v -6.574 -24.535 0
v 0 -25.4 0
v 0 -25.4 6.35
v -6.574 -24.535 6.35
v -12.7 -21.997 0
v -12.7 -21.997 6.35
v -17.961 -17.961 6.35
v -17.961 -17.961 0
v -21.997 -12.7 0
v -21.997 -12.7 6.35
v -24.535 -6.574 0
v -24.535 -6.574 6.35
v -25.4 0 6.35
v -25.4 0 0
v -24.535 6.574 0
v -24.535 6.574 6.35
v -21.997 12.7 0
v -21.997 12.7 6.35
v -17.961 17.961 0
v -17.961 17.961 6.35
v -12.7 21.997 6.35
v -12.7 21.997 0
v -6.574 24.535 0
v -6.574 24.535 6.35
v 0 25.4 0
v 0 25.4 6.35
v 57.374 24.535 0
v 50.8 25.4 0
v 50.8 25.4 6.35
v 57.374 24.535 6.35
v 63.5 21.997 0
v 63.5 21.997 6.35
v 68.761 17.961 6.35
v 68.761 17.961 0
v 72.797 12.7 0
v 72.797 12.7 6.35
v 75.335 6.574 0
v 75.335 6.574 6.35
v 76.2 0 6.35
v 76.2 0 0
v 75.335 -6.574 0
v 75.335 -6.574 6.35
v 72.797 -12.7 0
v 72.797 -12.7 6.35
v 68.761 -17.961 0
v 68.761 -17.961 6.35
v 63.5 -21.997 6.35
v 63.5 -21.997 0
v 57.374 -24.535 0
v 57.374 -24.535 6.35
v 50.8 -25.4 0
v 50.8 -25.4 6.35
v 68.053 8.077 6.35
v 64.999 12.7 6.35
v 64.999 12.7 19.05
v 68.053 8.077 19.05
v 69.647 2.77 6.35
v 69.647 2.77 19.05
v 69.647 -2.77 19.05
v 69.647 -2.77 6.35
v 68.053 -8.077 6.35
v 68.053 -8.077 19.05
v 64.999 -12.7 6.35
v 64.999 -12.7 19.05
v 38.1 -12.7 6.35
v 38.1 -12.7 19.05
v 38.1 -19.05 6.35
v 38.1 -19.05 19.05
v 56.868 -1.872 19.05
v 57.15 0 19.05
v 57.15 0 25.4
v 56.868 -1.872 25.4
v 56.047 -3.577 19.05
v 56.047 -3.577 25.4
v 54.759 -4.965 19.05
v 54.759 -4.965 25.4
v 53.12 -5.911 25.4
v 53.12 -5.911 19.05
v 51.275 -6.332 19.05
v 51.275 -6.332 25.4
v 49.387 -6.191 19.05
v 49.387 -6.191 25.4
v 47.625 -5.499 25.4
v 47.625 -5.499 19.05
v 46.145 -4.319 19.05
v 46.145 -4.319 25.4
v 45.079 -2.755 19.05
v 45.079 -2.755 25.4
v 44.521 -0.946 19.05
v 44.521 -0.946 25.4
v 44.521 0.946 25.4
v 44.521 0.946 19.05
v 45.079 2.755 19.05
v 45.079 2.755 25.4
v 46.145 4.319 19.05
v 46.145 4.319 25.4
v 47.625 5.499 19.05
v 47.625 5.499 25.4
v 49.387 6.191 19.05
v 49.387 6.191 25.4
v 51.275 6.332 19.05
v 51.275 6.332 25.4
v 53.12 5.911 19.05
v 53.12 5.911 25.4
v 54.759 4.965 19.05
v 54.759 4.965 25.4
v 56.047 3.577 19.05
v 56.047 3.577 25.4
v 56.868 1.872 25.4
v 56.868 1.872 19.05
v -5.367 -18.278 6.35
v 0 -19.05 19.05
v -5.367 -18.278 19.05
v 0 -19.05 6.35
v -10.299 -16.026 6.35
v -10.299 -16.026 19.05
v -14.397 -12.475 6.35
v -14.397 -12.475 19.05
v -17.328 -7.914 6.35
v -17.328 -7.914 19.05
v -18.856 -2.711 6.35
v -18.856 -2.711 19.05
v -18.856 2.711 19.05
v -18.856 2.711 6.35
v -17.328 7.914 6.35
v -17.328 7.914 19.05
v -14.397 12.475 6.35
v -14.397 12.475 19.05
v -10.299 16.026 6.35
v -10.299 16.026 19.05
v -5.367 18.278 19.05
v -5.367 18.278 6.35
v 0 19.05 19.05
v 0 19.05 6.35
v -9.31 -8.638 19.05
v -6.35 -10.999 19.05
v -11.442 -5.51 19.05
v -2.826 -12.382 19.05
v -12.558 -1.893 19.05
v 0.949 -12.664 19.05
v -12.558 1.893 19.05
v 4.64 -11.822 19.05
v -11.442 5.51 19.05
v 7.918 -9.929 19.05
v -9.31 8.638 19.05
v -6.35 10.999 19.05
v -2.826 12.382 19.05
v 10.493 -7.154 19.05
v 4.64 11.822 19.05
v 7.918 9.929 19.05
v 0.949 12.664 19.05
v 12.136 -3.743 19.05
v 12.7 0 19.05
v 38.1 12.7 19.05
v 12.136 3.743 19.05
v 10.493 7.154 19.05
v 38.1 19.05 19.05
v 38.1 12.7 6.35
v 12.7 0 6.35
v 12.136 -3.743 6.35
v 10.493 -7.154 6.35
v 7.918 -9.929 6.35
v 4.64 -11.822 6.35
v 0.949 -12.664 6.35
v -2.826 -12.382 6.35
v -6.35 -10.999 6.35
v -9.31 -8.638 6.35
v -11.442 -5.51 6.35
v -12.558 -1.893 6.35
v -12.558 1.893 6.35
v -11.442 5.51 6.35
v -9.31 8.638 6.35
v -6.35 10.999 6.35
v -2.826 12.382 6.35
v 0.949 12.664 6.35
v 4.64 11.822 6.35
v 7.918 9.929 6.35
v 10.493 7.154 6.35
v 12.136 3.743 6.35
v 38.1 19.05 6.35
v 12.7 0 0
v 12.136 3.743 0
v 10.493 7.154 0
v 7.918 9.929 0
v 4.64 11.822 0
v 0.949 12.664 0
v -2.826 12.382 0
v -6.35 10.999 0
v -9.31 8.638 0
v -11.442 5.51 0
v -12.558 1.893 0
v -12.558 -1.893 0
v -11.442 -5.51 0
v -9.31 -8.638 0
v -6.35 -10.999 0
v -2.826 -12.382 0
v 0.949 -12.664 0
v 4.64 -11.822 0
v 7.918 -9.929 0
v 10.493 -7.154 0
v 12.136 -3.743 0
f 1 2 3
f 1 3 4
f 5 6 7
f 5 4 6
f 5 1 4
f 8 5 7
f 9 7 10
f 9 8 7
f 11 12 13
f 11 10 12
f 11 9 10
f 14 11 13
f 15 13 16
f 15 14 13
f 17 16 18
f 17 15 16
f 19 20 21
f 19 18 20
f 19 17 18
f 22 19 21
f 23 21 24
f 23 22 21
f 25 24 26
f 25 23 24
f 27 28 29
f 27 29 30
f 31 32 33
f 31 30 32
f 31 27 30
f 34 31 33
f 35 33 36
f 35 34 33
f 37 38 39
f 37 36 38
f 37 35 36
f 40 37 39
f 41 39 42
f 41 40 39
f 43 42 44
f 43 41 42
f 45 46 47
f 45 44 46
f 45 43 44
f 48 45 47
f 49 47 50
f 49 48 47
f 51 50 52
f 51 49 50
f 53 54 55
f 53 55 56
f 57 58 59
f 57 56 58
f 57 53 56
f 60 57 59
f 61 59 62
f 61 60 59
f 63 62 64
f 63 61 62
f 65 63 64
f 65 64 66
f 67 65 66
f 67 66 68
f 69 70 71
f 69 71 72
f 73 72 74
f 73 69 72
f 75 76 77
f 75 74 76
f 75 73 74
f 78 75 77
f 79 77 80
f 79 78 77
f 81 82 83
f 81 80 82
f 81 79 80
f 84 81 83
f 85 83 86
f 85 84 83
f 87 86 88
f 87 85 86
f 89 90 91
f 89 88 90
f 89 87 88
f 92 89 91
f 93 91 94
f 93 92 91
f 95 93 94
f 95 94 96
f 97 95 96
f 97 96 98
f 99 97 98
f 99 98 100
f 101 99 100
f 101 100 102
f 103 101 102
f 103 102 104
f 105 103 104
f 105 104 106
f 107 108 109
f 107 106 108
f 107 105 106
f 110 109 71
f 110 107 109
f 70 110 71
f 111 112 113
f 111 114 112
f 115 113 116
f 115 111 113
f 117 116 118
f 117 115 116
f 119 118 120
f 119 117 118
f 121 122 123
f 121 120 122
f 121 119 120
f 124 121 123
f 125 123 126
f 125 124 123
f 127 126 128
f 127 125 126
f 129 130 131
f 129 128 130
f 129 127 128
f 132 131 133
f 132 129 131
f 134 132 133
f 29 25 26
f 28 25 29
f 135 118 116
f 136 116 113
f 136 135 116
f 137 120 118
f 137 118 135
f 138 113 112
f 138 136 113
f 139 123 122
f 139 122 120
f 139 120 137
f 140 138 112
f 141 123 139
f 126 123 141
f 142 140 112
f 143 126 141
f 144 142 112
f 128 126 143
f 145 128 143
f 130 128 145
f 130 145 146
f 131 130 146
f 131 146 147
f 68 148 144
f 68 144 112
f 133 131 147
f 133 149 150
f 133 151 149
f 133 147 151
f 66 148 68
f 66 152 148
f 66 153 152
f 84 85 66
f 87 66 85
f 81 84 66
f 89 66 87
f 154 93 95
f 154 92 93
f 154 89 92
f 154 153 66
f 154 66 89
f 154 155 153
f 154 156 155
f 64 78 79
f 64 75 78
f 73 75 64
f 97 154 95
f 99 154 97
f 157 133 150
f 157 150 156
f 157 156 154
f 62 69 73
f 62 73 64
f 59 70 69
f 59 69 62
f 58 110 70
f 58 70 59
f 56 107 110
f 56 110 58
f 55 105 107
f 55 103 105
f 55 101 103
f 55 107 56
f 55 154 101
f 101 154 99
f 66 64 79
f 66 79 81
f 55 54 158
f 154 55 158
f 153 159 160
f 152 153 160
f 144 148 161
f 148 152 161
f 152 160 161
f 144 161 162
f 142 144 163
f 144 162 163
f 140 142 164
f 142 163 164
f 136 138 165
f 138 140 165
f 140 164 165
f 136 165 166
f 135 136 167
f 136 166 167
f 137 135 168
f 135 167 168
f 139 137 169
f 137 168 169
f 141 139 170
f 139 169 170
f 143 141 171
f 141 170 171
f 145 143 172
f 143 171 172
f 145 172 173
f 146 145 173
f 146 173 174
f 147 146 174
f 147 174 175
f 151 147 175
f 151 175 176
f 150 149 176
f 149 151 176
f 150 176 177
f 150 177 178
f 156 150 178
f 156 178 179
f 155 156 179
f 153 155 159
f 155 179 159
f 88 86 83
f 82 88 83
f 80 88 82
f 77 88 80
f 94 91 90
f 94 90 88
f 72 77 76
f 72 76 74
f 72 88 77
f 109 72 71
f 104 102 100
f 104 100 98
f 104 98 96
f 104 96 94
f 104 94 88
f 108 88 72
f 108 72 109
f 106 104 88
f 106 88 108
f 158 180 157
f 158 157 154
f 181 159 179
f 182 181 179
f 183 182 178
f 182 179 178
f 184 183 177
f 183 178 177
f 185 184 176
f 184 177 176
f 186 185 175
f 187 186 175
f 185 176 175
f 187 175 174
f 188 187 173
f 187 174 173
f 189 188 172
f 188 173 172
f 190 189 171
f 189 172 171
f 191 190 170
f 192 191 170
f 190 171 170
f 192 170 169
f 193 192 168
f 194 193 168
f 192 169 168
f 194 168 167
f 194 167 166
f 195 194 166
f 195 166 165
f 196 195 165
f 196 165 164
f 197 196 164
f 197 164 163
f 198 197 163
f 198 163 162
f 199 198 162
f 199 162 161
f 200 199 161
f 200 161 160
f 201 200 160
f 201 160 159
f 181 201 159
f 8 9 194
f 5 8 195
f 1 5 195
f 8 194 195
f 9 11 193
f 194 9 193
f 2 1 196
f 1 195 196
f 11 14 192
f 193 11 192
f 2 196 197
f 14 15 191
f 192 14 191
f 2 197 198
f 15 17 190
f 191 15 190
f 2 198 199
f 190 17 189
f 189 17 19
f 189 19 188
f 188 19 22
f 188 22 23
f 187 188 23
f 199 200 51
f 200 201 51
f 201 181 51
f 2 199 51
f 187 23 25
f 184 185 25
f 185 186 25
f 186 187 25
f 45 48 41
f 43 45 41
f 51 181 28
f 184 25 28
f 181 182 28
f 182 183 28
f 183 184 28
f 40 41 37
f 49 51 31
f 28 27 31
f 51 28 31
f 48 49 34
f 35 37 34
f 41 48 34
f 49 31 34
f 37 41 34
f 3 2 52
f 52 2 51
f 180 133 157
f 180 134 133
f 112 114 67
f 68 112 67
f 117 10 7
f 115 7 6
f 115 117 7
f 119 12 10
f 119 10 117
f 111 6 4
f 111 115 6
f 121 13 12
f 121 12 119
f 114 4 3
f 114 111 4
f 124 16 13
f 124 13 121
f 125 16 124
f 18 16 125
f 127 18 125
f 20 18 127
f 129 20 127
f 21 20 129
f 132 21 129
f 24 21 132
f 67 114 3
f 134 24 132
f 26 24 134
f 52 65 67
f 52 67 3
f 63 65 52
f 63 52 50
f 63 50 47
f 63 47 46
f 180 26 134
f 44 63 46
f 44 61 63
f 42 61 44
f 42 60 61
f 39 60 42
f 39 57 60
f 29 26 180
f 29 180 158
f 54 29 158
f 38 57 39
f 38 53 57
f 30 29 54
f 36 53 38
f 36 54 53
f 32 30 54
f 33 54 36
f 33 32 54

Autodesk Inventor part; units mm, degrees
ref_plane "YZ Plane" through (0, 0, 0) normal (1, 0, 0) x (0, 1, 0)
ref_plane "XZ Plane" through (0, 0, 0) normal (0, 1, 0) x (-1, 0, 0)
ref_plane "XY Plane" through (0, 0, 0) normal (0, 0, 1) x (1, 0, 0)
sketch "Sketch1" plane through (0, 0, 0) normal (0, 0, 1) x (1, 0, 0)
  arc A0 (0, 25.4) -> (0, -25.4) centre (0, 0) ccw
  arc A1 (50.8, -25.4) -> (50.8, 25.4) centre (50.8, 0) ccw
  line L0 (0, 25.4) -> (50.8, 25.4)
  line L1 (0, -25.4) -> (50.8, -25.4)
  dimension "d2" = 50.8
  dimension "d3" = 50.8
  dimension "d4" = 50.8
extrude "Extrusion1" add sketch "Sketch1" along normal blind 6.35
sketch "Sketch2" plane through (0, 0, 6.35) normal (0, 0, 1) x (1, 0, 0)
  arc A0 (0, 25.4) -> (0, -25.4) centre (0, 0) ccw projected
  line L0 (0, -25.4) -> (50.8, -25.4) projected
  arc A1 (50.8, -25.4) -> (50.8, 25.4) centre (50.8, 0) ccw projected
  line L1 (50.8, 25.4) -> (0, 25.4) projected
  arc A2 (0, 19.05) -> (0, -19.05) centre (0, 0) ccw
  arc A3 (64.999, -12.7) -> (64.999, 12.7) centre (50.8, 0) ccw
  line L2 (0, -19.05) -> (38.1, -19.05)
  line L3 (0, 19.05) -> (38.1, 19.05)
  line L4 (64.999, -12.7) -> (38.1, -12.7)
  line L5 (64.999, 12.7) -> (38.1, 12.7)
  circle A4 centre (0, 0) radius 12.7
  line L6 (38.1, 19.05) -> (38.1, 12.7)
  line L7 (38.1, -12.7) -> (38.1, -19.05)
  dimension "d8" = 38.1
  dimension "d9" = 38.1
  dimension "d10" = 38.1
  dimension "d11" = 38.1
  dimension "d16" = 25.4
  dimension "d17" = 25.4
extrude "Extrusion2" add sketch "Sketch2" along normal blind 12.7 contours L3 L6 L5 A3 L4 L7 L2 A2
sketch "Sketch3" plane through (0, 0, 6.35) normal (0, 0, 1) x (1, 0, 0)
  circle A0 centre (0, 0) radius 12.7
  dimension "d20" = 25.4
extrude "Extrusion3" cut sketch "Sketch3" against normal through all
sketch "Sketch4" plane through (0, 0, 19.05) normal (0, 0, 1) x (1, 0, 0)
  circle A0 centre (0, 0) radius 12.7 projected
  arc A1 (0, 19.05) -> (0, -19.05) centre (0, 0) ccw projected
  line L0 (0, -19.05) -> (38.1, -19.05) projected
  line L1 (38.1, -19.05) -> (38.1, -12.7) projected
  line L2 (38.1, -12.7) -> (64.999, -12.7) projected
  arc A2 (64.999, -12.7) -> (64.999, 12.7) centre (50.8, 0) ccw projected
  line L3 (64.999, 12.7) -> (38.1, 12.7) projected
  line L4 (38.1, 12.7) -> (38.1, 19.05) projected
  line L5 (38.1, 19.05) -> (0, 19.05) projected
  circle A3 centre (50.8, 0) radius 6.35
  dimension "d23" = 12.7
extrude "Extrusion4" add sketch "Sketch4" along normal blind 6.35 contours A3
properties part number "HW 6 Part 6"
